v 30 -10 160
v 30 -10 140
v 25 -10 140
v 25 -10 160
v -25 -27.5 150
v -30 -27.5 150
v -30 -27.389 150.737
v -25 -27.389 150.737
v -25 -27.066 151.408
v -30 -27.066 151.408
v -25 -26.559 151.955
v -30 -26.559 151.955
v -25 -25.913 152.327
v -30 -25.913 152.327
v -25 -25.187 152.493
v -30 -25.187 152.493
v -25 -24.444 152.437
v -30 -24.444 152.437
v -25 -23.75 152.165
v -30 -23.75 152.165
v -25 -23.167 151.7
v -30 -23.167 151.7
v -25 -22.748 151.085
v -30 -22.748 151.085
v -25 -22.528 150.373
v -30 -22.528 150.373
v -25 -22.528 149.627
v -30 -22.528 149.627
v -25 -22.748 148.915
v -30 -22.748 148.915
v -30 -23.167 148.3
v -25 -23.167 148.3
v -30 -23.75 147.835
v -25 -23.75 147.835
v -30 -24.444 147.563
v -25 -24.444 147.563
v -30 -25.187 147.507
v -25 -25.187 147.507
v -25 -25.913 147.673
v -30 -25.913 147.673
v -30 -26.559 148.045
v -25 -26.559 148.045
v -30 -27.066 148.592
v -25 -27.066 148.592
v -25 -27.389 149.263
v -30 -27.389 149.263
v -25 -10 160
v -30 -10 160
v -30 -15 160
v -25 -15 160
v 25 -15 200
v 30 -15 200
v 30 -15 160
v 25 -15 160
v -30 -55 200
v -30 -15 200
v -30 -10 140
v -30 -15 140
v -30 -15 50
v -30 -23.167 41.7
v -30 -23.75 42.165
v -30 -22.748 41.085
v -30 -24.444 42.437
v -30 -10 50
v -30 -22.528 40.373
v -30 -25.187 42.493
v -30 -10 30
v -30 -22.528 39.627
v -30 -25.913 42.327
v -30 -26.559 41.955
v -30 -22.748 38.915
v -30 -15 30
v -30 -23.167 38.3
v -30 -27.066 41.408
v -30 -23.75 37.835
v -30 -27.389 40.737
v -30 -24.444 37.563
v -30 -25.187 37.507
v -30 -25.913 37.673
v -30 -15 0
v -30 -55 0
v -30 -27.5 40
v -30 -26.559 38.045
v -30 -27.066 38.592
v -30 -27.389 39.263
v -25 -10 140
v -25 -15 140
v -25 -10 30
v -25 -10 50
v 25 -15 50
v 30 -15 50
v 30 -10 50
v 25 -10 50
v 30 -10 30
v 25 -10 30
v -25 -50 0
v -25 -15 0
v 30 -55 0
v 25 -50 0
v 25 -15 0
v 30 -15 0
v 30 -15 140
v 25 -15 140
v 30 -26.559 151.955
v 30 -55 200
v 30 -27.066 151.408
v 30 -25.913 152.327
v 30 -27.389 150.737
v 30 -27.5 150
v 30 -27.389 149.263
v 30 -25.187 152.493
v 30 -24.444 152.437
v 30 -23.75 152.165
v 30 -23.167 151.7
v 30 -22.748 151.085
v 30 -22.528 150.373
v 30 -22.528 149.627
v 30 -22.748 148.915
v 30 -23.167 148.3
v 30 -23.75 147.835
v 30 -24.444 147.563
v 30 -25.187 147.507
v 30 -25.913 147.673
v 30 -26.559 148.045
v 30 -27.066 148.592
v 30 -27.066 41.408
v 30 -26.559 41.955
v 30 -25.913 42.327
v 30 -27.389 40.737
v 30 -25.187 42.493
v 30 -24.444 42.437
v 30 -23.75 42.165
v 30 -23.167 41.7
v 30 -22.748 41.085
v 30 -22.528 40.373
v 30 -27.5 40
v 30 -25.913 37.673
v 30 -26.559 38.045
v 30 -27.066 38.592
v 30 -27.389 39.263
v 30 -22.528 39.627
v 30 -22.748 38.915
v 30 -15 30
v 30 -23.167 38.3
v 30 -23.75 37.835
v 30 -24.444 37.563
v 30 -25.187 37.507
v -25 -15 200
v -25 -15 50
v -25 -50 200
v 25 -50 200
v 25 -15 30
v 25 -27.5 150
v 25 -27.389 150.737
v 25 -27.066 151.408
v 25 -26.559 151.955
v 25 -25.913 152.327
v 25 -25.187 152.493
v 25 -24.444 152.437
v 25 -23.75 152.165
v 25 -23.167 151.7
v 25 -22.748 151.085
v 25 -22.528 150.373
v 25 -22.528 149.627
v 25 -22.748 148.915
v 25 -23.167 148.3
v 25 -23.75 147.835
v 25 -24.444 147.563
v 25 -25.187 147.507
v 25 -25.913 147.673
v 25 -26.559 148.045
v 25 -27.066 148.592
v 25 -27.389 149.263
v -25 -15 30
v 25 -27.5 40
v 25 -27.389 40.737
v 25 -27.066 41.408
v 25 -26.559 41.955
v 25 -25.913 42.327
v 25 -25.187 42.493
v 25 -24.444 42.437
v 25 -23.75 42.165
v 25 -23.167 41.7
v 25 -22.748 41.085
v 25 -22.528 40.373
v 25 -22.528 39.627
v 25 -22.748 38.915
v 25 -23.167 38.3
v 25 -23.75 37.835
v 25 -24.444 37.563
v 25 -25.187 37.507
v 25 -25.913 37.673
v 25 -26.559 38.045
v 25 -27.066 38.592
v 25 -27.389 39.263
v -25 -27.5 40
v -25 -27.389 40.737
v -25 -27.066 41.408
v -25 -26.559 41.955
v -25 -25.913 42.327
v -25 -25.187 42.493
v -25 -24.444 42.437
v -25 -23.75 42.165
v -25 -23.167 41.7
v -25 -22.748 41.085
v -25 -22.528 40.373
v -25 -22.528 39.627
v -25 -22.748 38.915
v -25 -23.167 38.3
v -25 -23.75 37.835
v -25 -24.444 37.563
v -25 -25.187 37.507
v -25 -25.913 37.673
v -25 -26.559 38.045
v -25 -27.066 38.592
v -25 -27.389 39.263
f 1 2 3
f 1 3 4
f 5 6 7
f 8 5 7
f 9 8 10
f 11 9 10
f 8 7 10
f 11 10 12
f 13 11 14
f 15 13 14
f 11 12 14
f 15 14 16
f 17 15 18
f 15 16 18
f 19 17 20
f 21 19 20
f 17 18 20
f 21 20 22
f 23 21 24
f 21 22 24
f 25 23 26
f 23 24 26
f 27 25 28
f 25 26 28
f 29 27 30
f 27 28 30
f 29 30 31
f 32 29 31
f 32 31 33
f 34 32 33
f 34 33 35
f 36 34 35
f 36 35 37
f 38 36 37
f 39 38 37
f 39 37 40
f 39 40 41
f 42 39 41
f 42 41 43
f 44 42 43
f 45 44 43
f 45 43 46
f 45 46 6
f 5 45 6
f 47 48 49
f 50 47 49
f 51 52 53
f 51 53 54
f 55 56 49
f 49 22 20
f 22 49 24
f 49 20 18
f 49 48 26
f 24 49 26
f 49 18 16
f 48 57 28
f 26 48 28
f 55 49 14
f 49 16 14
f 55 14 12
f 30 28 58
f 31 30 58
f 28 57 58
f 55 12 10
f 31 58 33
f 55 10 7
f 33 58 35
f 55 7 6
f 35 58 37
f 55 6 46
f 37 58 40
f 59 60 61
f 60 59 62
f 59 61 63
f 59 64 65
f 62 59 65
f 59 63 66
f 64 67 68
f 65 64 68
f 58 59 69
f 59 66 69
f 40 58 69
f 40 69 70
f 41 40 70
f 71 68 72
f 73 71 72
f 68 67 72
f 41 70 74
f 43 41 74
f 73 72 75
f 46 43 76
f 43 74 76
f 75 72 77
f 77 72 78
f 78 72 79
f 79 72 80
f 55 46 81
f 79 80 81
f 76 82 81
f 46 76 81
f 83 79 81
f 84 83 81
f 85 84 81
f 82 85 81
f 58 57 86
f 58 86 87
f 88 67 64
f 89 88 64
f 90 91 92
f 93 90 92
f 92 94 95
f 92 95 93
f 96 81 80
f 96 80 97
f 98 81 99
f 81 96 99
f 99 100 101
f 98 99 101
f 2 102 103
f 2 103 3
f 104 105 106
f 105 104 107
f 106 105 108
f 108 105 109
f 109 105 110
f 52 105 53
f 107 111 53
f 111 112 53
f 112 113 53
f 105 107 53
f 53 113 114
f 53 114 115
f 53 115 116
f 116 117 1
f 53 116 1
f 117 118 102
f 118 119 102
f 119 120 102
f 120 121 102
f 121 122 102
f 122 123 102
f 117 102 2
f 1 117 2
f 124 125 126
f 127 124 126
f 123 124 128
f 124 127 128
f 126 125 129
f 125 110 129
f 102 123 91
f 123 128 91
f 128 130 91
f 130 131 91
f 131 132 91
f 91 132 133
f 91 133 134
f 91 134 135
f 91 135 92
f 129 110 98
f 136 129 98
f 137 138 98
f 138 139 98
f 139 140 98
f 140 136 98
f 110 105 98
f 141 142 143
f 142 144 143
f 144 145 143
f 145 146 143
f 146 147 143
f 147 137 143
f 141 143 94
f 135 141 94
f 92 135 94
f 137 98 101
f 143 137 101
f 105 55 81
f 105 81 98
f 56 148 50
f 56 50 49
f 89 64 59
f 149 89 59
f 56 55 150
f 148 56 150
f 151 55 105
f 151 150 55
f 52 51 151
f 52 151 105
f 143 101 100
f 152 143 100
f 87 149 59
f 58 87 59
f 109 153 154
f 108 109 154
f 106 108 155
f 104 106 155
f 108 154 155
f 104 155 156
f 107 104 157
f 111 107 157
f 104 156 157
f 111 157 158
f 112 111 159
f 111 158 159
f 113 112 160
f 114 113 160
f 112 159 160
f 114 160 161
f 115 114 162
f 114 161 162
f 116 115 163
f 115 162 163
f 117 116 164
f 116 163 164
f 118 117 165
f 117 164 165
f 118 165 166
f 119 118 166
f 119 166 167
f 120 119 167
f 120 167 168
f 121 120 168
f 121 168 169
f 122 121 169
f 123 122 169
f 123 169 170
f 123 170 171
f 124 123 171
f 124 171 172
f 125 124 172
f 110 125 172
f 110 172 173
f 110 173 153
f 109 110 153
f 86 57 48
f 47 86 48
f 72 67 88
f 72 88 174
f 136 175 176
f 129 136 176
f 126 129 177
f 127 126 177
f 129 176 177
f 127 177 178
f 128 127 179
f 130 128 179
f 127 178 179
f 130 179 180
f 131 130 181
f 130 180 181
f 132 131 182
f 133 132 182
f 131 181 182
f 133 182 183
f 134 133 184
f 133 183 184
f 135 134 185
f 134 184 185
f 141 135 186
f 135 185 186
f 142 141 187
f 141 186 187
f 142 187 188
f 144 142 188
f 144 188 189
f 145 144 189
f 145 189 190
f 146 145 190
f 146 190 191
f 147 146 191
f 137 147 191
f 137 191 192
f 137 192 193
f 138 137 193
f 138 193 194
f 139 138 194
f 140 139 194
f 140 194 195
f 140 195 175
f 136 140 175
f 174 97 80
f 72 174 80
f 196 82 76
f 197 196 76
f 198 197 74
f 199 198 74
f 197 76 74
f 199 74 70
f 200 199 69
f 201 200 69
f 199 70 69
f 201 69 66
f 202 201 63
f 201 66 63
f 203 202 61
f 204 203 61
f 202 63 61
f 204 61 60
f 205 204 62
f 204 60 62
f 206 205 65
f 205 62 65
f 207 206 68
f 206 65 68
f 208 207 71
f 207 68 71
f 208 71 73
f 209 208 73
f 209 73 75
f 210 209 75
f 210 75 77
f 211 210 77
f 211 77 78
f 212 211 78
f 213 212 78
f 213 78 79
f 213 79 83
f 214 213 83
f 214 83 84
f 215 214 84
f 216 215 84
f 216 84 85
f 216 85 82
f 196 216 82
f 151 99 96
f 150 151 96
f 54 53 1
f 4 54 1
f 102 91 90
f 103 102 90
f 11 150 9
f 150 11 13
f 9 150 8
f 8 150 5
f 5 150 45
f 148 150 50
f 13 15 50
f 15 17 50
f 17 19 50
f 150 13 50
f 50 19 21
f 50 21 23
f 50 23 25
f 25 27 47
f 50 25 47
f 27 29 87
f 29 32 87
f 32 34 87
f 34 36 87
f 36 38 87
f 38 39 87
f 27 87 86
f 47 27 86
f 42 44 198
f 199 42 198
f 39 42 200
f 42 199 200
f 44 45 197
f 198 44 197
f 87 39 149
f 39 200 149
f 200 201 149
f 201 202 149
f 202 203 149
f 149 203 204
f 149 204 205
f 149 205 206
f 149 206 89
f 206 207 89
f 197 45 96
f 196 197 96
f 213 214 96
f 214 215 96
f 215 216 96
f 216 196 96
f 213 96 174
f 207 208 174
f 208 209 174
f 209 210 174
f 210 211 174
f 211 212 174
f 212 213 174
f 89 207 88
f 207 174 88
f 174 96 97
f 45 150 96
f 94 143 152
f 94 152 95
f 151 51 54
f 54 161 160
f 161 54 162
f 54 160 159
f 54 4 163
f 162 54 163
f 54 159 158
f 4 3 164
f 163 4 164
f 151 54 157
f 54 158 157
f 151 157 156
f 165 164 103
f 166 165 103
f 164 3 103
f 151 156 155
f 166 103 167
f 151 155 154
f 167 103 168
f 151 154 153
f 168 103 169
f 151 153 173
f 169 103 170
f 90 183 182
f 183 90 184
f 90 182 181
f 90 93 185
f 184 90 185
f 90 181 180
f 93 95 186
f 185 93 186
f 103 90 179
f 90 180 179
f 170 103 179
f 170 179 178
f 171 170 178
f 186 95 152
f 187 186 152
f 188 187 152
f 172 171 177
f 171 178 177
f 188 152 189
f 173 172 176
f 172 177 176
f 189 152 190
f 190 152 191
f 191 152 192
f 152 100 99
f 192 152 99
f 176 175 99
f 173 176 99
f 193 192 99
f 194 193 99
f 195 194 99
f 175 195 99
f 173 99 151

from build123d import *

# Parameters (mm, degrees)
F2_DEPTH = 200
F3_W     = 5
F3_H     = 20
F4_DEPTH = 5
F5_W     = 5
F5_H     = 20
F6_DEPTH = 5
F7_D     = 5


with BuildPart() as f2:
    # F1 (on Top) → F2 (new body)
    with BuildSketch(Plane.XY):
        Polygon((30, -55), (30, -15), (25, -15), (25, -50), (-25, -50), (-25, -15), (-30, -15), (-30, -55), align=None)
    extrude(amount=F2_DEPTH)

    # F3 (on face) → F4 (join)
    with BuildSketch(Plane.YZ.offset(30)):
        with Locations((-12.5, 150)):
            Rectangle(F3_W, F3_H)
        with Locations((-12.5, 40)):
            Rectangle(F3_W, F3_H)
    extrude(amount=-F4_DEPTH)

    # F5 (on face) → F6 (join)
    with BuildSketch(Plane(origin=(-30, 0, 0), x_dir=(0, -1, 0), z_dir=(-1, 0, 0))):
        with Locations((12.5, 150)):
            Rectangle(F5_W, F5_H)
        with Locations((12.5, 40)):
            Rectangle(F5_W, F5_H)
    extrude(amount=-F6_DEPTH)

    # F7 (through all)
    with Locations(Plane.YZ.offset(30)):
        with Locations((-25, 150), (-25, 40)):
            Hole(F7_D / 2)


solid = f2.part
